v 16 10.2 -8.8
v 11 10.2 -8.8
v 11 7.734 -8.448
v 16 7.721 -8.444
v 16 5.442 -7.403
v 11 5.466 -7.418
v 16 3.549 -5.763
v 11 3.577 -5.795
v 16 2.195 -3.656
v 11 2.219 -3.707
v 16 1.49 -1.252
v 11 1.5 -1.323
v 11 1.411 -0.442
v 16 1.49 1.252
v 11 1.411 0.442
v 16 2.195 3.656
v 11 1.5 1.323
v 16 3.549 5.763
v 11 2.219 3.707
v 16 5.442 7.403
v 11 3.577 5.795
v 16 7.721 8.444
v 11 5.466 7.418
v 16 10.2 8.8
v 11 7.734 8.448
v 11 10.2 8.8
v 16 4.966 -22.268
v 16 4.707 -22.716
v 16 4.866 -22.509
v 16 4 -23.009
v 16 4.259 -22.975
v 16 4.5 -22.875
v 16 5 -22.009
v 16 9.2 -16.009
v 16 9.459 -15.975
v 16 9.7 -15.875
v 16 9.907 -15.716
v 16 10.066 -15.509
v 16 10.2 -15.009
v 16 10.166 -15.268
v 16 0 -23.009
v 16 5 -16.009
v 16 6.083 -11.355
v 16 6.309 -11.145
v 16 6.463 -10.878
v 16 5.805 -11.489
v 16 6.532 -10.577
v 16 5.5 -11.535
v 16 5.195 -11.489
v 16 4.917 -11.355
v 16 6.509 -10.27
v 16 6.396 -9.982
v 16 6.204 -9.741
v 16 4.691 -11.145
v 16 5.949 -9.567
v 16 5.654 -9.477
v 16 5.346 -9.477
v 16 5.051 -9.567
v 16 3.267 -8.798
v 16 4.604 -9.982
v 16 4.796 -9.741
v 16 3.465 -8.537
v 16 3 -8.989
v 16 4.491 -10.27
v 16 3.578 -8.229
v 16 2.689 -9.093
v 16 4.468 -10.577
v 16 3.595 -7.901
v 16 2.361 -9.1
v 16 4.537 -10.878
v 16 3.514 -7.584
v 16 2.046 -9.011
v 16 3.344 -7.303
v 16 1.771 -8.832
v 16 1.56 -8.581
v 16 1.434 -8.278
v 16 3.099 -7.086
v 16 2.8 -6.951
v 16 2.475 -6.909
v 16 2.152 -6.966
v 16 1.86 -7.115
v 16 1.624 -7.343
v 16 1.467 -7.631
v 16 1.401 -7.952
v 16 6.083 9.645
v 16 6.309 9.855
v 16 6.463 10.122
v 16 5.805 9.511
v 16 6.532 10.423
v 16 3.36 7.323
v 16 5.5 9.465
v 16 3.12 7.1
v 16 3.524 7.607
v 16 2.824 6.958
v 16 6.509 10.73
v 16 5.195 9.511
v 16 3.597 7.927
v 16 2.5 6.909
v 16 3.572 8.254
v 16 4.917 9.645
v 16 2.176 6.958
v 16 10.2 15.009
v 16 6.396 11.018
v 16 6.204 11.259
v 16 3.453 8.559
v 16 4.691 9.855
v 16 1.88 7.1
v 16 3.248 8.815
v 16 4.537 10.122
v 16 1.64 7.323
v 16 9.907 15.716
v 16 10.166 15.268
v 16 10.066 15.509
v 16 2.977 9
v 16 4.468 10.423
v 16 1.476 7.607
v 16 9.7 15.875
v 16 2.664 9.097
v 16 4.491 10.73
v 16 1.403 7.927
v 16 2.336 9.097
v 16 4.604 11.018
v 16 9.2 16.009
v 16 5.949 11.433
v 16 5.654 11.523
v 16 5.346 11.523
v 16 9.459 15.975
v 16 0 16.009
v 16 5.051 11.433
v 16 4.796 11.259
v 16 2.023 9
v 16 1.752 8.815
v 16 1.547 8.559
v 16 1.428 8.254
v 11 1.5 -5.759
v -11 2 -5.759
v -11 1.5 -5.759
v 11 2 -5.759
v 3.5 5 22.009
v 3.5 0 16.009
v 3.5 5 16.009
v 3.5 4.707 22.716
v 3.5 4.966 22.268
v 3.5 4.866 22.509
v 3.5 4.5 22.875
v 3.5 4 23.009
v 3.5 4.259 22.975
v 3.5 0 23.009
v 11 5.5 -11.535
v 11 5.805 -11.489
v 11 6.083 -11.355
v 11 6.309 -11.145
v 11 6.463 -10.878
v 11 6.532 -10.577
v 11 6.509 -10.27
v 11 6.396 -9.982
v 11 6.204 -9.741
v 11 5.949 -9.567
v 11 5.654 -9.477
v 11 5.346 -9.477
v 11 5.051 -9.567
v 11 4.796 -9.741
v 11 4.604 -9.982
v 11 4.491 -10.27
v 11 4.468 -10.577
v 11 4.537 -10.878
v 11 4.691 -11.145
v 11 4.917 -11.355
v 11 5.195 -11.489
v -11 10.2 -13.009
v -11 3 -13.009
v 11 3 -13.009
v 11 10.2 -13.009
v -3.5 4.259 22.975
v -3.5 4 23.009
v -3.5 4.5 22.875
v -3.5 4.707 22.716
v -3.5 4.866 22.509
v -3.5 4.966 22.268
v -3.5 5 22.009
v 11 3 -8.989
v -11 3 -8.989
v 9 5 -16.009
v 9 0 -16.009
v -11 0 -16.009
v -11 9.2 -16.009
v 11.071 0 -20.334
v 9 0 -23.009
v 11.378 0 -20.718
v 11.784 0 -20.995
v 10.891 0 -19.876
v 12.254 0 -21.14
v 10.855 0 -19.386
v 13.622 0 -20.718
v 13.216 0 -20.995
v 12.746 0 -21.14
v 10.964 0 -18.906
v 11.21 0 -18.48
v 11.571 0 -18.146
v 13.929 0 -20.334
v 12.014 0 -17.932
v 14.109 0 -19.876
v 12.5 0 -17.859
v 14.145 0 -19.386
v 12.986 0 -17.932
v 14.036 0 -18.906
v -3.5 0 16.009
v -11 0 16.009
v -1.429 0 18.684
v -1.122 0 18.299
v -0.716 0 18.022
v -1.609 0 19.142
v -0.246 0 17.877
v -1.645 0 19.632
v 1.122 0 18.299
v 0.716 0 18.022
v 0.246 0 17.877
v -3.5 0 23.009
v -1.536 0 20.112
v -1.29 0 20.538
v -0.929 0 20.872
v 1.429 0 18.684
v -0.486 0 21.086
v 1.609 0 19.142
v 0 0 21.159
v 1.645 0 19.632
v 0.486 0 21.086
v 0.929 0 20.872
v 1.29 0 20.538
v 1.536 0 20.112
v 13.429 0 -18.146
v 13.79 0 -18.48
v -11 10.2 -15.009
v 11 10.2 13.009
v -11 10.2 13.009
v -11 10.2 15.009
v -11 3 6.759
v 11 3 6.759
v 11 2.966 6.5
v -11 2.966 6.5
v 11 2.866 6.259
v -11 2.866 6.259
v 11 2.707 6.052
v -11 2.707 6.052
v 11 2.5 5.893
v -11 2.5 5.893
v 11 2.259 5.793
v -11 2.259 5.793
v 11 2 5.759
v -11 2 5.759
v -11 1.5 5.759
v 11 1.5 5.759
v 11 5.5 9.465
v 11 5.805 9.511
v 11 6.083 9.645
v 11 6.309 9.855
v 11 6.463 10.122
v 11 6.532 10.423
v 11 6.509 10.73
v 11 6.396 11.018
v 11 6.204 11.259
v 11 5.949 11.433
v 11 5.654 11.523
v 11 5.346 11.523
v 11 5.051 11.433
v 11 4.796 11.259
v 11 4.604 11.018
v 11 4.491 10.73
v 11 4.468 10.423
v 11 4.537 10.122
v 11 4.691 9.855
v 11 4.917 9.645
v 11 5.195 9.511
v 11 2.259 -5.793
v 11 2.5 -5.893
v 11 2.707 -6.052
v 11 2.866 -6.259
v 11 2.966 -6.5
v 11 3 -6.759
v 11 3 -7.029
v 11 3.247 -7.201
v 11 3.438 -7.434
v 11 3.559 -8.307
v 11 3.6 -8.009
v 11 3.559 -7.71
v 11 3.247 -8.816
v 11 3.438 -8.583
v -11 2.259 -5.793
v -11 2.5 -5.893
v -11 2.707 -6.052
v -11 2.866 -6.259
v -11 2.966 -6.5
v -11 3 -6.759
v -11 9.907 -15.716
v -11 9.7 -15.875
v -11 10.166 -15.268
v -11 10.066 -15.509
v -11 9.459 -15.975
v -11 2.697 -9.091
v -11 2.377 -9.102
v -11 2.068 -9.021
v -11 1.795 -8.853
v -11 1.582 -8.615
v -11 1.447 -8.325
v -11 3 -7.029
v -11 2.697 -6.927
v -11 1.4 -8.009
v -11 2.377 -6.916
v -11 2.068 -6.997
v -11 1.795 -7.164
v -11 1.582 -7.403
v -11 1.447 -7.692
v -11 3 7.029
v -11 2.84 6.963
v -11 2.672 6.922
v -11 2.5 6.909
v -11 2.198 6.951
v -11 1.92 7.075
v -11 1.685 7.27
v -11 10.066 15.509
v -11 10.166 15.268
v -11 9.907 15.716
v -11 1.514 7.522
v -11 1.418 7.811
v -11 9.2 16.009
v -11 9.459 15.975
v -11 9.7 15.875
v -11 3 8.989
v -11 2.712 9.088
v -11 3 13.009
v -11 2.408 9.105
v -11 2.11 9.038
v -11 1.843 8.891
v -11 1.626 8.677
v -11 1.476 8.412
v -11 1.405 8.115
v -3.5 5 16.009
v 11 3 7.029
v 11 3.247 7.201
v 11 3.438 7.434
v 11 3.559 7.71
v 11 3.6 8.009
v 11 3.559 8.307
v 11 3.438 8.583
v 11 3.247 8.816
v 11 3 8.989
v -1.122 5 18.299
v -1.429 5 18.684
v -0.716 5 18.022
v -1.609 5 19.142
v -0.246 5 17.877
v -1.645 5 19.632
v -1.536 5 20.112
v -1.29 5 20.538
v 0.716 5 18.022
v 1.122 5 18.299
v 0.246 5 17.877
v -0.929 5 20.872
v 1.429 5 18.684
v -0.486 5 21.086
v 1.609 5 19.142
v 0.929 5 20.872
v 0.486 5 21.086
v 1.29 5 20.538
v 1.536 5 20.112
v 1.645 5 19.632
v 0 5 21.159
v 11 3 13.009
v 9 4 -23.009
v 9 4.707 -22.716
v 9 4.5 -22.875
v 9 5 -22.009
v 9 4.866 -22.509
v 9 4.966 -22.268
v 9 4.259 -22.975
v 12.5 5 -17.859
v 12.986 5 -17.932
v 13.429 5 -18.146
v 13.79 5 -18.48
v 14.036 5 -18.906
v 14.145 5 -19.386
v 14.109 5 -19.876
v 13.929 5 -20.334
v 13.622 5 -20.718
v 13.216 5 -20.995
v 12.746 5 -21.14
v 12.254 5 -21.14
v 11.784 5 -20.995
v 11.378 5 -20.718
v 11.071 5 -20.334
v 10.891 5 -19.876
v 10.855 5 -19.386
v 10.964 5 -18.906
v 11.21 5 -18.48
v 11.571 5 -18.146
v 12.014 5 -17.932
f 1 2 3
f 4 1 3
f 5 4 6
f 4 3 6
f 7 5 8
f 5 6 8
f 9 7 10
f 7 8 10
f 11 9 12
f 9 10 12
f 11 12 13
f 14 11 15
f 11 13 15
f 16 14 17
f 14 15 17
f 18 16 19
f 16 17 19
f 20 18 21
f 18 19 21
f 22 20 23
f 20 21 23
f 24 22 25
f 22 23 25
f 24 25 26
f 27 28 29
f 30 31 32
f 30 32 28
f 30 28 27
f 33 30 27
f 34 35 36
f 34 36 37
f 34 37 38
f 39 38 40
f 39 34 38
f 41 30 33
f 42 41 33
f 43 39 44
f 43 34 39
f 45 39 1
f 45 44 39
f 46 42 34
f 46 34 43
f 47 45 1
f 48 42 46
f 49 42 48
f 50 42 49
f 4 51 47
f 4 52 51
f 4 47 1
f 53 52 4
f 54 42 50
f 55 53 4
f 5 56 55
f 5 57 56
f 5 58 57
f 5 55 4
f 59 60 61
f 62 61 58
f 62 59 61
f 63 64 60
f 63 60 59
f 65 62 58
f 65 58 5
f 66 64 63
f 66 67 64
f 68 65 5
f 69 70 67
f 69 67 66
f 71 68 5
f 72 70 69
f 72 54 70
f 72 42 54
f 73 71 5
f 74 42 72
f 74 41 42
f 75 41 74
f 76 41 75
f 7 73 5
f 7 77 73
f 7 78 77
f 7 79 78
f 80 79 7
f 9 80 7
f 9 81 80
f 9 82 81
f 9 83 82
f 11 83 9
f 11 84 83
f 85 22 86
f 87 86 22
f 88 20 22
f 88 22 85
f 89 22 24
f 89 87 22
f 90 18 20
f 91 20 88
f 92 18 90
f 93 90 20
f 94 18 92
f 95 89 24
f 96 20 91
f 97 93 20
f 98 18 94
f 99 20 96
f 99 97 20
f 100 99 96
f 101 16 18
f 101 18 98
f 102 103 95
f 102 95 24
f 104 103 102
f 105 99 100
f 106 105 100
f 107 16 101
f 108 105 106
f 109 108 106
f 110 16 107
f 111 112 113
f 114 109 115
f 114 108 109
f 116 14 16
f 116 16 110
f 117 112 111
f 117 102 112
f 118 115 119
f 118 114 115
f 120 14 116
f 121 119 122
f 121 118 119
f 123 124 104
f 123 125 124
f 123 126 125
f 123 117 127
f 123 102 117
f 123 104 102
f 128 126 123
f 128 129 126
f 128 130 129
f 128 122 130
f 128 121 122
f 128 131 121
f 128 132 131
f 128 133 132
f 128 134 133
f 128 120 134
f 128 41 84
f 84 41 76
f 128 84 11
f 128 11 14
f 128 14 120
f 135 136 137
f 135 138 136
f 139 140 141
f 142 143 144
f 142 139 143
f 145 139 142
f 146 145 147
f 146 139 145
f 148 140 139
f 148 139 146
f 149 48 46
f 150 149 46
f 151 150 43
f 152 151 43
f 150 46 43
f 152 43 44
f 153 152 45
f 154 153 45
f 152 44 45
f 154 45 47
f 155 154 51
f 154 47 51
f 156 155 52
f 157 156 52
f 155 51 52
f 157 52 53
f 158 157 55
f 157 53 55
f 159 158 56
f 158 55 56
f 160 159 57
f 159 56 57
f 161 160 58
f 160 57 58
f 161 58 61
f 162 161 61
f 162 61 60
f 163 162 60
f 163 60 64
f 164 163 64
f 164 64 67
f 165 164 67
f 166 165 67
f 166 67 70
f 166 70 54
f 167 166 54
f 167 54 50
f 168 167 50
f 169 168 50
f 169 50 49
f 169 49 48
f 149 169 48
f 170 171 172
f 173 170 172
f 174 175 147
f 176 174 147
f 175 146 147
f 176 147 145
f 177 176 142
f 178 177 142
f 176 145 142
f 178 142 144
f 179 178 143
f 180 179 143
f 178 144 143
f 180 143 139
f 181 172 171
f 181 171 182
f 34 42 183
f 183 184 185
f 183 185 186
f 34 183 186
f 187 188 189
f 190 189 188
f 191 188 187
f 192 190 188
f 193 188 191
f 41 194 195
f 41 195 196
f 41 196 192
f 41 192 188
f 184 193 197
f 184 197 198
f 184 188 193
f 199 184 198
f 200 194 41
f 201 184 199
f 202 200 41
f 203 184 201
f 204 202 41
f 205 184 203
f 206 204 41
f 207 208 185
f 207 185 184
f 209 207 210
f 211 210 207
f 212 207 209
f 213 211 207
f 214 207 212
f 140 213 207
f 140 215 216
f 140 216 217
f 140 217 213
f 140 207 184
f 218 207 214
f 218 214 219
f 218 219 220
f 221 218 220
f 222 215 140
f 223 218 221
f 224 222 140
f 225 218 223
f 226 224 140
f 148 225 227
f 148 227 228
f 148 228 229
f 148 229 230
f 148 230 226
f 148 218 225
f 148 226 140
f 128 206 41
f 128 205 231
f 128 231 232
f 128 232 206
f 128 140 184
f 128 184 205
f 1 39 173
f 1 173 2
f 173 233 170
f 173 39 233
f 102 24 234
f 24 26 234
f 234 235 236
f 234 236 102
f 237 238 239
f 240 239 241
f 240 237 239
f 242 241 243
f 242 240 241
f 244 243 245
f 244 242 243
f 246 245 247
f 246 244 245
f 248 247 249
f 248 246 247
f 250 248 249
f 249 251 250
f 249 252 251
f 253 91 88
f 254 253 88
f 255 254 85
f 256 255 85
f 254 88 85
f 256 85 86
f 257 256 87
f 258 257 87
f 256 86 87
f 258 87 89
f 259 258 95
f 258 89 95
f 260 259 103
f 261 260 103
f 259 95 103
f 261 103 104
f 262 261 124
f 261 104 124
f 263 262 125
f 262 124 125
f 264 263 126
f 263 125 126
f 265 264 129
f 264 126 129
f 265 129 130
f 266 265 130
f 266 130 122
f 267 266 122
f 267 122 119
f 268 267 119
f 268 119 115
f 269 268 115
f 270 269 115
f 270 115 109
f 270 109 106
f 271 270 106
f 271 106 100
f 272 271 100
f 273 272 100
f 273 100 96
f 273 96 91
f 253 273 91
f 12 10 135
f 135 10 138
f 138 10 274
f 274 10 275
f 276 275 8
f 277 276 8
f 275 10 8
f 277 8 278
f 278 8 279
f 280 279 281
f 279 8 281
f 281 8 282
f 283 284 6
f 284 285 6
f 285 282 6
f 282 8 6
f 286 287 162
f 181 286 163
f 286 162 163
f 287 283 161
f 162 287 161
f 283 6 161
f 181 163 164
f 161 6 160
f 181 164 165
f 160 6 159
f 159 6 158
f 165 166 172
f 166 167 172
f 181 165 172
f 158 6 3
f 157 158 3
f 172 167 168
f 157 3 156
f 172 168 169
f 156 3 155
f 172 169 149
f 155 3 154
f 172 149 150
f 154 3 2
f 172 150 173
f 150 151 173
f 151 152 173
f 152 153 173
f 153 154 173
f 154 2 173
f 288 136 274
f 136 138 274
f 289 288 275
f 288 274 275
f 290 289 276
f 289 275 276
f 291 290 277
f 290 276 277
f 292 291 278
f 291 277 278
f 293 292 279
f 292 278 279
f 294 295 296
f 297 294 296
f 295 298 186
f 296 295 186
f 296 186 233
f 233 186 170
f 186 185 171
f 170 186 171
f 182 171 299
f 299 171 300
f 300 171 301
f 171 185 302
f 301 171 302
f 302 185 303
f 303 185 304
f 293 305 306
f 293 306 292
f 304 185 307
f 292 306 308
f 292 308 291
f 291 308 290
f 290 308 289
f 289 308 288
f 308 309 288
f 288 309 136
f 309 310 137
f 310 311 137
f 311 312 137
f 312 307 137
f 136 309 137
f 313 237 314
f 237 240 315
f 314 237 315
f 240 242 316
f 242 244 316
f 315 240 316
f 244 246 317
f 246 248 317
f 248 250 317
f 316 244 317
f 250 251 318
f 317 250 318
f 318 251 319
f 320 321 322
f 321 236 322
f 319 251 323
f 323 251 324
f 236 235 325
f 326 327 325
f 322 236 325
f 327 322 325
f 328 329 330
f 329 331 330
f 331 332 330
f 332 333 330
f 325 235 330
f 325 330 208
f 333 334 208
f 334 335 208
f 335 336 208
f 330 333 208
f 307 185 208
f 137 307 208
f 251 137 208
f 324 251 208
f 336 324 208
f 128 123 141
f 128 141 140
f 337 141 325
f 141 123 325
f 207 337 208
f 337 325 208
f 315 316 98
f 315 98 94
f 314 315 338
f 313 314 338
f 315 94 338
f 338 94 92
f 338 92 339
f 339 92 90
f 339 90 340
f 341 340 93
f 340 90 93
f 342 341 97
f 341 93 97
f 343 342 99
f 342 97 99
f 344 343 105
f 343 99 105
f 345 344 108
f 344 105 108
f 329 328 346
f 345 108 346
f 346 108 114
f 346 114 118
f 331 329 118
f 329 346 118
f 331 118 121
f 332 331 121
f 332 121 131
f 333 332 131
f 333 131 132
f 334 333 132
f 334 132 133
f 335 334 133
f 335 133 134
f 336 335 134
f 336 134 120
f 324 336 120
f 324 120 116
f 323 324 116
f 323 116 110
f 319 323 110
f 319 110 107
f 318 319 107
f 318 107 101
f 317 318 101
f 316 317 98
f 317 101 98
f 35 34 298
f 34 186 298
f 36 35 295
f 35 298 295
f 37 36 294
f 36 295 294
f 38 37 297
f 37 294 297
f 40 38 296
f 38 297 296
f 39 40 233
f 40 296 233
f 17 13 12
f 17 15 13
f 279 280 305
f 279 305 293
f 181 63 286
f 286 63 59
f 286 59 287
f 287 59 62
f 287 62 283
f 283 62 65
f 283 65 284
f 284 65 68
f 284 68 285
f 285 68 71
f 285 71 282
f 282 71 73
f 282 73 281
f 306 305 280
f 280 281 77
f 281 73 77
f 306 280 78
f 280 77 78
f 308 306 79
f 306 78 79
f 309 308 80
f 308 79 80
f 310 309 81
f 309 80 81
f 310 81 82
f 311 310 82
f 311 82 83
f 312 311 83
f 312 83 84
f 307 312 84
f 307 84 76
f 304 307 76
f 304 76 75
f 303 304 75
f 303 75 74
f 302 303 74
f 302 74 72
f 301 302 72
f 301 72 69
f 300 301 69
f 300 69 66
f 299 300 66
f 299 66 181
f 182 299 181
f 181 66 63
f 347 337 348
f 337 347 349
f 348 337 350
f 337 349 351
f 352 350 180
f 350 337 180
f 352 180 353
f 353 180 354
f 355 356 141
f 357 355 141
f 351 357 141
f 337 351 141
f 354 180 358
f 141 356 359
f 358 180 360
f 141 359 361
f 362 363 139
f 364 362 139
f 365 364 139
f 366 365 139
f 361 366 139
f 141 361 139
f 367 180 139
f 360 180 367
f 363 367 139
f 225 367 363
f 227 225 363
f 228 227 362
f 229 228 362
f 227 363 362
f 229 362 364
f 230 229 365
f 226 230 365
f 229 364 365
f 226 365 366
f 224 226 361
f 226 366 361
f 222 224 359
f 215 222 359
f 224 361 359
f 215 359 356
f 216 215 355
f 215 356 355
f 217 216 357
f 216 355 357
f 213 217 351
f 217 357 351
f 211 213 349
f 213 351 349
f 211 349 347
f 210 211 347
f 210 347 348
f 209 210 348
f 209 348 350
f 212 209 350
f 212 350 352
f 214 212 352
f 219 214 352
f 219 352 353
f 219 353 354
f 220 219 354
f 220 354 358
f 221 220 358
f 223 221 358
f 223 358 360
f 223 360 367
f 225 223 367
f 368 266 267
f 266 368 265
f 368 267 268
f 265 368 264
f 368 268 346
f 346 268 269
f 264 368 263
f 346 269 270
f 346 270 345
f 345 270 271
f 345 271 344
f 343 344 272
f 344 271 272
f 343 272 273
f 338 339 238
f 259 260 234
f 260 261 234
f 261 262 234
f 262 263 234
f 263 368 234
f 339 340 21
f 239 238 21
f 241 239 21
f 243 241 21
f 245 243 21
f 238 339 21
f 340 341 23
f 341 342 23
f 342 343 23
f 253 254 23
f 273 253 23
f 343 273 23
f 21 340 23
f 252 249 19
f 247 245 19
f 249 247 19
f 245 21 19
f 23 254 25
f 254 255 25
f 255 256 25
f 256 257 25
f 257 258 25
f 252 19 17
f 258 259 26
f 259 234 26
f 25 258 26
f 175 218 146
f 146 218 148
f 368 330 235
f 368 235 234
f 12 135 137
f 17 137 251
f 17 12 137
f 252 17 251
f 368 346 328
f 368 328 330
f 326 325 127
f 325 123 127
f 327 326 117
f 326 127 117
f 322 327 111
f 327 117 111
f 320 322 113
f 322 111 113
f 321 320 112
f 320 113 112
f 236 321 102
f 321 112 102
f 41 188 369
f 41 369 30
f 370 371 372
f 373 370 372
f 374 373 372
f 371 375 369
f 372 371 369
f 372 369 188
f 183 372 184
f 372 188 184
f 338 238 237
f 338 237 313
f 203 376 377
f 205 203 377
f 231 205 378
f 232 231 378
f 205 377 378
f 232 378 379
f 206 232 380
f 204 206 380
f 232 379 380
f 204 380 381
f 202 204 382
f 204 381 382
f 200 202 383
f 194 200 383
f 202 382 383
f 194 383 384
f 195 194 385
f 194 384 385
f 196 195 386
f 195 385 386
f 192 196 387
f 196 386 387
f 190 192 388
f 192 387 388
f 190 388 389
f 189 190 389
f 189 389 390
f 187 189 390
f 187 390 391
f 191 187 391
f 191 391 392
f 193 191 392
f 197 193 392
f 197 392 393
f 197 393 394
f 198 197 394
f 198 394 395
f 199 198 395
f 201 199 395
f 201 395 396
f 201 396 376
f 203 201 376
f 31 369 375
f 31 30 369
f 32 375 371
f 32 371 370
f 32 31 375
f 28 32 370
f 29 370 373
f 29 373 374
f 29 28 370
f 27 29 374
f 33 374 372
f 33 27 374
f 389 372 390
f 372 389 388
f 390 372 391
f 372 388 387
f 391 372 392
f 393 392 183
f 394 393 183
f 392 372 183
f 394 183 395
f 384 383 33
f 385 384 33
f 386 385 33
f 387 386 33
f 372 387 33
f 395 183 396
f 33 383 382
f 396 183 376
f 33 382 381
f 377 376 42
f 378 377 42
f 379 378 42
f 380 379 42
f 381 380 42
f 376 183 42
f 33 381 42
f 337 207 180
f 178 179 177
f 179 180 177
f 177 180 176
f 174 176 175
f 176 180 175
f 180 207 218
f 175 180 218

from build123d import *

# Parameters (mm, degrees)
BOSS_EXTRUDE1_DEPTH = 11
SKETCH3_W           = 22
SKETCH3_H           = 3
BOSS_EXTRUDE2_DEPTH = 10.2
BOSS_EXTRUDE3_DEPTH = 5
SKETCH5_R           = 1.035
SKETCH5_R_2         = 1.1
CUT_EXTRUDE1_DEPTH  = 34.004922045
SKETCH6_W           = 7
SKETCH6_H           = 7
BOSS_EXTRUDE4_DEPTH = 5
SKETCH7_R           = 1.65
CUT_EXTRUDE2_DEPTH  = 29.50349942
FILLET1_R           = 1


with BuildPart() as part:
    # Sketch1 → Boss-Extrude1 (new, symmetric)
    with BuildSketch(Plane(origin=(0, 0, 0), x_dir=(0, 0, -1), z_dir=(1, 0, 0))):
        Polygon((-13.0089, 0), (13.0089, 0), (13.0089, 3), (5.7589, 3), (5.7589, 1.5), (-5.7589, 1.5), (-5.7589, 3), (-13.0089, 3), align=None)
    extrude(amount=BOSS_EXTRUDE1_DEPTH, both=True)

    # Sketch3 → Boss-Extrude2 (add)
    with BuildSketch(Plane.XZ):
        with Locations((0, -14.5089)):
            Rectangle(SKETCH3_W, SKETCH3_H)
        with Locations((0, 14.5089)):
            Rectangle(SKETCH3_W, SKETCH3_H)
    extrude(amount=-BOSS_EXTRUDE2_DEPTH)

    # Sketch4 → Boss-Extrude3 (add)
    with BuildSketch(Plane(origin=(11, 0, 0), x_dir=(0, 0, -1), z_dir=(1, 0, 0))):
        with BuildLine():
            Line((-8.8, 10.2), (-16.0089, 10.2))
            Line((-16.0089, 10.2), (-16.0089, 0))
            Line((-16.0089, 0), (16.0089, 0))
            Line((16.0089, 0), (16.0089, 10.2))
            Line((16.0089, 10.2), (8.8, 10.2))
            ThreePointArc((8.8, 10.2), (0, 1.4), (-8.8, 10.2))
        make_face()
    extrude(amount=BOSS_EXTRUDE3_DEPTH)

    # Sketch5 → Cut-Extrude1 (cut, through all)
    with BuildSketch(Plane(origin=(16, 0, 0), x_dir=(0, 0, -1), z_dir=(1, 0, 0))):
        with Locations((-10.5, 5.5)):
            Circle(SKETCH5_R)
        with Locations((10.5, 5.5)):
            Circle(SKETCH5_R)
        with Locations((-8.0089, 2.5)):
            Circle(SKETCH5_R_2)
        with Locations(Location((8.0089, 2.5, 0), (0, 0, 27.035691789))):
            Circle(SKETCH5_R_2)
    extrude(amount=-CUT_EXTRUDE1_DEPTH, mode=Mode.SUBTRACT)

    # Sketch6 → Boss-Extrude4 (add)
    with BuildSketch(Plane.XZ):
        with Locations((0, 19.5089)):
            Rectangle(SKETCH6_W, SKETCH6_H)
        with Locations((12.5, -19.5089)):
            Rectangle(SKETCH6_W, SKETCH6_H)
    extrude(amount=-BOSS_EXTRUDE4_DEPTH)

    # Sketch7 → Cut-Extrude2 (cut, through all)
    with BuildSketch(Plane(origin=(0, 5, 0), x_dir=(1, 0, 0), z_dir=(0, 1, 0))):
        with Locations(Location((0, -19.5089, 0), (0, 0, 270))):
            Circle(SKETCH7_R)
        with Locations(Location((12.5, 19.5089, 0), (0, 0, 270))):
            Circle(SKETCH7_R)
    extrude(amount=-CUT_EXTRUDE2_DEPTH, mode=Mode.SUBTRACT)

    # Fillet1
    fillet1_edges = [part.edges().sort_by_distance(p)[0] for p in [
        (0, 5, 23.0089),
        (12.5, 5, -23.0089),
        (0, 3, 5.7589),
        (0, 3, -5.7589),
        (2.5, 10.2, -16.0089),
        (2.5, 10.2, 16.0089),
    ]]
    fillet(fillet1_edges, radius=FILLET1_R)


solid = part.part
